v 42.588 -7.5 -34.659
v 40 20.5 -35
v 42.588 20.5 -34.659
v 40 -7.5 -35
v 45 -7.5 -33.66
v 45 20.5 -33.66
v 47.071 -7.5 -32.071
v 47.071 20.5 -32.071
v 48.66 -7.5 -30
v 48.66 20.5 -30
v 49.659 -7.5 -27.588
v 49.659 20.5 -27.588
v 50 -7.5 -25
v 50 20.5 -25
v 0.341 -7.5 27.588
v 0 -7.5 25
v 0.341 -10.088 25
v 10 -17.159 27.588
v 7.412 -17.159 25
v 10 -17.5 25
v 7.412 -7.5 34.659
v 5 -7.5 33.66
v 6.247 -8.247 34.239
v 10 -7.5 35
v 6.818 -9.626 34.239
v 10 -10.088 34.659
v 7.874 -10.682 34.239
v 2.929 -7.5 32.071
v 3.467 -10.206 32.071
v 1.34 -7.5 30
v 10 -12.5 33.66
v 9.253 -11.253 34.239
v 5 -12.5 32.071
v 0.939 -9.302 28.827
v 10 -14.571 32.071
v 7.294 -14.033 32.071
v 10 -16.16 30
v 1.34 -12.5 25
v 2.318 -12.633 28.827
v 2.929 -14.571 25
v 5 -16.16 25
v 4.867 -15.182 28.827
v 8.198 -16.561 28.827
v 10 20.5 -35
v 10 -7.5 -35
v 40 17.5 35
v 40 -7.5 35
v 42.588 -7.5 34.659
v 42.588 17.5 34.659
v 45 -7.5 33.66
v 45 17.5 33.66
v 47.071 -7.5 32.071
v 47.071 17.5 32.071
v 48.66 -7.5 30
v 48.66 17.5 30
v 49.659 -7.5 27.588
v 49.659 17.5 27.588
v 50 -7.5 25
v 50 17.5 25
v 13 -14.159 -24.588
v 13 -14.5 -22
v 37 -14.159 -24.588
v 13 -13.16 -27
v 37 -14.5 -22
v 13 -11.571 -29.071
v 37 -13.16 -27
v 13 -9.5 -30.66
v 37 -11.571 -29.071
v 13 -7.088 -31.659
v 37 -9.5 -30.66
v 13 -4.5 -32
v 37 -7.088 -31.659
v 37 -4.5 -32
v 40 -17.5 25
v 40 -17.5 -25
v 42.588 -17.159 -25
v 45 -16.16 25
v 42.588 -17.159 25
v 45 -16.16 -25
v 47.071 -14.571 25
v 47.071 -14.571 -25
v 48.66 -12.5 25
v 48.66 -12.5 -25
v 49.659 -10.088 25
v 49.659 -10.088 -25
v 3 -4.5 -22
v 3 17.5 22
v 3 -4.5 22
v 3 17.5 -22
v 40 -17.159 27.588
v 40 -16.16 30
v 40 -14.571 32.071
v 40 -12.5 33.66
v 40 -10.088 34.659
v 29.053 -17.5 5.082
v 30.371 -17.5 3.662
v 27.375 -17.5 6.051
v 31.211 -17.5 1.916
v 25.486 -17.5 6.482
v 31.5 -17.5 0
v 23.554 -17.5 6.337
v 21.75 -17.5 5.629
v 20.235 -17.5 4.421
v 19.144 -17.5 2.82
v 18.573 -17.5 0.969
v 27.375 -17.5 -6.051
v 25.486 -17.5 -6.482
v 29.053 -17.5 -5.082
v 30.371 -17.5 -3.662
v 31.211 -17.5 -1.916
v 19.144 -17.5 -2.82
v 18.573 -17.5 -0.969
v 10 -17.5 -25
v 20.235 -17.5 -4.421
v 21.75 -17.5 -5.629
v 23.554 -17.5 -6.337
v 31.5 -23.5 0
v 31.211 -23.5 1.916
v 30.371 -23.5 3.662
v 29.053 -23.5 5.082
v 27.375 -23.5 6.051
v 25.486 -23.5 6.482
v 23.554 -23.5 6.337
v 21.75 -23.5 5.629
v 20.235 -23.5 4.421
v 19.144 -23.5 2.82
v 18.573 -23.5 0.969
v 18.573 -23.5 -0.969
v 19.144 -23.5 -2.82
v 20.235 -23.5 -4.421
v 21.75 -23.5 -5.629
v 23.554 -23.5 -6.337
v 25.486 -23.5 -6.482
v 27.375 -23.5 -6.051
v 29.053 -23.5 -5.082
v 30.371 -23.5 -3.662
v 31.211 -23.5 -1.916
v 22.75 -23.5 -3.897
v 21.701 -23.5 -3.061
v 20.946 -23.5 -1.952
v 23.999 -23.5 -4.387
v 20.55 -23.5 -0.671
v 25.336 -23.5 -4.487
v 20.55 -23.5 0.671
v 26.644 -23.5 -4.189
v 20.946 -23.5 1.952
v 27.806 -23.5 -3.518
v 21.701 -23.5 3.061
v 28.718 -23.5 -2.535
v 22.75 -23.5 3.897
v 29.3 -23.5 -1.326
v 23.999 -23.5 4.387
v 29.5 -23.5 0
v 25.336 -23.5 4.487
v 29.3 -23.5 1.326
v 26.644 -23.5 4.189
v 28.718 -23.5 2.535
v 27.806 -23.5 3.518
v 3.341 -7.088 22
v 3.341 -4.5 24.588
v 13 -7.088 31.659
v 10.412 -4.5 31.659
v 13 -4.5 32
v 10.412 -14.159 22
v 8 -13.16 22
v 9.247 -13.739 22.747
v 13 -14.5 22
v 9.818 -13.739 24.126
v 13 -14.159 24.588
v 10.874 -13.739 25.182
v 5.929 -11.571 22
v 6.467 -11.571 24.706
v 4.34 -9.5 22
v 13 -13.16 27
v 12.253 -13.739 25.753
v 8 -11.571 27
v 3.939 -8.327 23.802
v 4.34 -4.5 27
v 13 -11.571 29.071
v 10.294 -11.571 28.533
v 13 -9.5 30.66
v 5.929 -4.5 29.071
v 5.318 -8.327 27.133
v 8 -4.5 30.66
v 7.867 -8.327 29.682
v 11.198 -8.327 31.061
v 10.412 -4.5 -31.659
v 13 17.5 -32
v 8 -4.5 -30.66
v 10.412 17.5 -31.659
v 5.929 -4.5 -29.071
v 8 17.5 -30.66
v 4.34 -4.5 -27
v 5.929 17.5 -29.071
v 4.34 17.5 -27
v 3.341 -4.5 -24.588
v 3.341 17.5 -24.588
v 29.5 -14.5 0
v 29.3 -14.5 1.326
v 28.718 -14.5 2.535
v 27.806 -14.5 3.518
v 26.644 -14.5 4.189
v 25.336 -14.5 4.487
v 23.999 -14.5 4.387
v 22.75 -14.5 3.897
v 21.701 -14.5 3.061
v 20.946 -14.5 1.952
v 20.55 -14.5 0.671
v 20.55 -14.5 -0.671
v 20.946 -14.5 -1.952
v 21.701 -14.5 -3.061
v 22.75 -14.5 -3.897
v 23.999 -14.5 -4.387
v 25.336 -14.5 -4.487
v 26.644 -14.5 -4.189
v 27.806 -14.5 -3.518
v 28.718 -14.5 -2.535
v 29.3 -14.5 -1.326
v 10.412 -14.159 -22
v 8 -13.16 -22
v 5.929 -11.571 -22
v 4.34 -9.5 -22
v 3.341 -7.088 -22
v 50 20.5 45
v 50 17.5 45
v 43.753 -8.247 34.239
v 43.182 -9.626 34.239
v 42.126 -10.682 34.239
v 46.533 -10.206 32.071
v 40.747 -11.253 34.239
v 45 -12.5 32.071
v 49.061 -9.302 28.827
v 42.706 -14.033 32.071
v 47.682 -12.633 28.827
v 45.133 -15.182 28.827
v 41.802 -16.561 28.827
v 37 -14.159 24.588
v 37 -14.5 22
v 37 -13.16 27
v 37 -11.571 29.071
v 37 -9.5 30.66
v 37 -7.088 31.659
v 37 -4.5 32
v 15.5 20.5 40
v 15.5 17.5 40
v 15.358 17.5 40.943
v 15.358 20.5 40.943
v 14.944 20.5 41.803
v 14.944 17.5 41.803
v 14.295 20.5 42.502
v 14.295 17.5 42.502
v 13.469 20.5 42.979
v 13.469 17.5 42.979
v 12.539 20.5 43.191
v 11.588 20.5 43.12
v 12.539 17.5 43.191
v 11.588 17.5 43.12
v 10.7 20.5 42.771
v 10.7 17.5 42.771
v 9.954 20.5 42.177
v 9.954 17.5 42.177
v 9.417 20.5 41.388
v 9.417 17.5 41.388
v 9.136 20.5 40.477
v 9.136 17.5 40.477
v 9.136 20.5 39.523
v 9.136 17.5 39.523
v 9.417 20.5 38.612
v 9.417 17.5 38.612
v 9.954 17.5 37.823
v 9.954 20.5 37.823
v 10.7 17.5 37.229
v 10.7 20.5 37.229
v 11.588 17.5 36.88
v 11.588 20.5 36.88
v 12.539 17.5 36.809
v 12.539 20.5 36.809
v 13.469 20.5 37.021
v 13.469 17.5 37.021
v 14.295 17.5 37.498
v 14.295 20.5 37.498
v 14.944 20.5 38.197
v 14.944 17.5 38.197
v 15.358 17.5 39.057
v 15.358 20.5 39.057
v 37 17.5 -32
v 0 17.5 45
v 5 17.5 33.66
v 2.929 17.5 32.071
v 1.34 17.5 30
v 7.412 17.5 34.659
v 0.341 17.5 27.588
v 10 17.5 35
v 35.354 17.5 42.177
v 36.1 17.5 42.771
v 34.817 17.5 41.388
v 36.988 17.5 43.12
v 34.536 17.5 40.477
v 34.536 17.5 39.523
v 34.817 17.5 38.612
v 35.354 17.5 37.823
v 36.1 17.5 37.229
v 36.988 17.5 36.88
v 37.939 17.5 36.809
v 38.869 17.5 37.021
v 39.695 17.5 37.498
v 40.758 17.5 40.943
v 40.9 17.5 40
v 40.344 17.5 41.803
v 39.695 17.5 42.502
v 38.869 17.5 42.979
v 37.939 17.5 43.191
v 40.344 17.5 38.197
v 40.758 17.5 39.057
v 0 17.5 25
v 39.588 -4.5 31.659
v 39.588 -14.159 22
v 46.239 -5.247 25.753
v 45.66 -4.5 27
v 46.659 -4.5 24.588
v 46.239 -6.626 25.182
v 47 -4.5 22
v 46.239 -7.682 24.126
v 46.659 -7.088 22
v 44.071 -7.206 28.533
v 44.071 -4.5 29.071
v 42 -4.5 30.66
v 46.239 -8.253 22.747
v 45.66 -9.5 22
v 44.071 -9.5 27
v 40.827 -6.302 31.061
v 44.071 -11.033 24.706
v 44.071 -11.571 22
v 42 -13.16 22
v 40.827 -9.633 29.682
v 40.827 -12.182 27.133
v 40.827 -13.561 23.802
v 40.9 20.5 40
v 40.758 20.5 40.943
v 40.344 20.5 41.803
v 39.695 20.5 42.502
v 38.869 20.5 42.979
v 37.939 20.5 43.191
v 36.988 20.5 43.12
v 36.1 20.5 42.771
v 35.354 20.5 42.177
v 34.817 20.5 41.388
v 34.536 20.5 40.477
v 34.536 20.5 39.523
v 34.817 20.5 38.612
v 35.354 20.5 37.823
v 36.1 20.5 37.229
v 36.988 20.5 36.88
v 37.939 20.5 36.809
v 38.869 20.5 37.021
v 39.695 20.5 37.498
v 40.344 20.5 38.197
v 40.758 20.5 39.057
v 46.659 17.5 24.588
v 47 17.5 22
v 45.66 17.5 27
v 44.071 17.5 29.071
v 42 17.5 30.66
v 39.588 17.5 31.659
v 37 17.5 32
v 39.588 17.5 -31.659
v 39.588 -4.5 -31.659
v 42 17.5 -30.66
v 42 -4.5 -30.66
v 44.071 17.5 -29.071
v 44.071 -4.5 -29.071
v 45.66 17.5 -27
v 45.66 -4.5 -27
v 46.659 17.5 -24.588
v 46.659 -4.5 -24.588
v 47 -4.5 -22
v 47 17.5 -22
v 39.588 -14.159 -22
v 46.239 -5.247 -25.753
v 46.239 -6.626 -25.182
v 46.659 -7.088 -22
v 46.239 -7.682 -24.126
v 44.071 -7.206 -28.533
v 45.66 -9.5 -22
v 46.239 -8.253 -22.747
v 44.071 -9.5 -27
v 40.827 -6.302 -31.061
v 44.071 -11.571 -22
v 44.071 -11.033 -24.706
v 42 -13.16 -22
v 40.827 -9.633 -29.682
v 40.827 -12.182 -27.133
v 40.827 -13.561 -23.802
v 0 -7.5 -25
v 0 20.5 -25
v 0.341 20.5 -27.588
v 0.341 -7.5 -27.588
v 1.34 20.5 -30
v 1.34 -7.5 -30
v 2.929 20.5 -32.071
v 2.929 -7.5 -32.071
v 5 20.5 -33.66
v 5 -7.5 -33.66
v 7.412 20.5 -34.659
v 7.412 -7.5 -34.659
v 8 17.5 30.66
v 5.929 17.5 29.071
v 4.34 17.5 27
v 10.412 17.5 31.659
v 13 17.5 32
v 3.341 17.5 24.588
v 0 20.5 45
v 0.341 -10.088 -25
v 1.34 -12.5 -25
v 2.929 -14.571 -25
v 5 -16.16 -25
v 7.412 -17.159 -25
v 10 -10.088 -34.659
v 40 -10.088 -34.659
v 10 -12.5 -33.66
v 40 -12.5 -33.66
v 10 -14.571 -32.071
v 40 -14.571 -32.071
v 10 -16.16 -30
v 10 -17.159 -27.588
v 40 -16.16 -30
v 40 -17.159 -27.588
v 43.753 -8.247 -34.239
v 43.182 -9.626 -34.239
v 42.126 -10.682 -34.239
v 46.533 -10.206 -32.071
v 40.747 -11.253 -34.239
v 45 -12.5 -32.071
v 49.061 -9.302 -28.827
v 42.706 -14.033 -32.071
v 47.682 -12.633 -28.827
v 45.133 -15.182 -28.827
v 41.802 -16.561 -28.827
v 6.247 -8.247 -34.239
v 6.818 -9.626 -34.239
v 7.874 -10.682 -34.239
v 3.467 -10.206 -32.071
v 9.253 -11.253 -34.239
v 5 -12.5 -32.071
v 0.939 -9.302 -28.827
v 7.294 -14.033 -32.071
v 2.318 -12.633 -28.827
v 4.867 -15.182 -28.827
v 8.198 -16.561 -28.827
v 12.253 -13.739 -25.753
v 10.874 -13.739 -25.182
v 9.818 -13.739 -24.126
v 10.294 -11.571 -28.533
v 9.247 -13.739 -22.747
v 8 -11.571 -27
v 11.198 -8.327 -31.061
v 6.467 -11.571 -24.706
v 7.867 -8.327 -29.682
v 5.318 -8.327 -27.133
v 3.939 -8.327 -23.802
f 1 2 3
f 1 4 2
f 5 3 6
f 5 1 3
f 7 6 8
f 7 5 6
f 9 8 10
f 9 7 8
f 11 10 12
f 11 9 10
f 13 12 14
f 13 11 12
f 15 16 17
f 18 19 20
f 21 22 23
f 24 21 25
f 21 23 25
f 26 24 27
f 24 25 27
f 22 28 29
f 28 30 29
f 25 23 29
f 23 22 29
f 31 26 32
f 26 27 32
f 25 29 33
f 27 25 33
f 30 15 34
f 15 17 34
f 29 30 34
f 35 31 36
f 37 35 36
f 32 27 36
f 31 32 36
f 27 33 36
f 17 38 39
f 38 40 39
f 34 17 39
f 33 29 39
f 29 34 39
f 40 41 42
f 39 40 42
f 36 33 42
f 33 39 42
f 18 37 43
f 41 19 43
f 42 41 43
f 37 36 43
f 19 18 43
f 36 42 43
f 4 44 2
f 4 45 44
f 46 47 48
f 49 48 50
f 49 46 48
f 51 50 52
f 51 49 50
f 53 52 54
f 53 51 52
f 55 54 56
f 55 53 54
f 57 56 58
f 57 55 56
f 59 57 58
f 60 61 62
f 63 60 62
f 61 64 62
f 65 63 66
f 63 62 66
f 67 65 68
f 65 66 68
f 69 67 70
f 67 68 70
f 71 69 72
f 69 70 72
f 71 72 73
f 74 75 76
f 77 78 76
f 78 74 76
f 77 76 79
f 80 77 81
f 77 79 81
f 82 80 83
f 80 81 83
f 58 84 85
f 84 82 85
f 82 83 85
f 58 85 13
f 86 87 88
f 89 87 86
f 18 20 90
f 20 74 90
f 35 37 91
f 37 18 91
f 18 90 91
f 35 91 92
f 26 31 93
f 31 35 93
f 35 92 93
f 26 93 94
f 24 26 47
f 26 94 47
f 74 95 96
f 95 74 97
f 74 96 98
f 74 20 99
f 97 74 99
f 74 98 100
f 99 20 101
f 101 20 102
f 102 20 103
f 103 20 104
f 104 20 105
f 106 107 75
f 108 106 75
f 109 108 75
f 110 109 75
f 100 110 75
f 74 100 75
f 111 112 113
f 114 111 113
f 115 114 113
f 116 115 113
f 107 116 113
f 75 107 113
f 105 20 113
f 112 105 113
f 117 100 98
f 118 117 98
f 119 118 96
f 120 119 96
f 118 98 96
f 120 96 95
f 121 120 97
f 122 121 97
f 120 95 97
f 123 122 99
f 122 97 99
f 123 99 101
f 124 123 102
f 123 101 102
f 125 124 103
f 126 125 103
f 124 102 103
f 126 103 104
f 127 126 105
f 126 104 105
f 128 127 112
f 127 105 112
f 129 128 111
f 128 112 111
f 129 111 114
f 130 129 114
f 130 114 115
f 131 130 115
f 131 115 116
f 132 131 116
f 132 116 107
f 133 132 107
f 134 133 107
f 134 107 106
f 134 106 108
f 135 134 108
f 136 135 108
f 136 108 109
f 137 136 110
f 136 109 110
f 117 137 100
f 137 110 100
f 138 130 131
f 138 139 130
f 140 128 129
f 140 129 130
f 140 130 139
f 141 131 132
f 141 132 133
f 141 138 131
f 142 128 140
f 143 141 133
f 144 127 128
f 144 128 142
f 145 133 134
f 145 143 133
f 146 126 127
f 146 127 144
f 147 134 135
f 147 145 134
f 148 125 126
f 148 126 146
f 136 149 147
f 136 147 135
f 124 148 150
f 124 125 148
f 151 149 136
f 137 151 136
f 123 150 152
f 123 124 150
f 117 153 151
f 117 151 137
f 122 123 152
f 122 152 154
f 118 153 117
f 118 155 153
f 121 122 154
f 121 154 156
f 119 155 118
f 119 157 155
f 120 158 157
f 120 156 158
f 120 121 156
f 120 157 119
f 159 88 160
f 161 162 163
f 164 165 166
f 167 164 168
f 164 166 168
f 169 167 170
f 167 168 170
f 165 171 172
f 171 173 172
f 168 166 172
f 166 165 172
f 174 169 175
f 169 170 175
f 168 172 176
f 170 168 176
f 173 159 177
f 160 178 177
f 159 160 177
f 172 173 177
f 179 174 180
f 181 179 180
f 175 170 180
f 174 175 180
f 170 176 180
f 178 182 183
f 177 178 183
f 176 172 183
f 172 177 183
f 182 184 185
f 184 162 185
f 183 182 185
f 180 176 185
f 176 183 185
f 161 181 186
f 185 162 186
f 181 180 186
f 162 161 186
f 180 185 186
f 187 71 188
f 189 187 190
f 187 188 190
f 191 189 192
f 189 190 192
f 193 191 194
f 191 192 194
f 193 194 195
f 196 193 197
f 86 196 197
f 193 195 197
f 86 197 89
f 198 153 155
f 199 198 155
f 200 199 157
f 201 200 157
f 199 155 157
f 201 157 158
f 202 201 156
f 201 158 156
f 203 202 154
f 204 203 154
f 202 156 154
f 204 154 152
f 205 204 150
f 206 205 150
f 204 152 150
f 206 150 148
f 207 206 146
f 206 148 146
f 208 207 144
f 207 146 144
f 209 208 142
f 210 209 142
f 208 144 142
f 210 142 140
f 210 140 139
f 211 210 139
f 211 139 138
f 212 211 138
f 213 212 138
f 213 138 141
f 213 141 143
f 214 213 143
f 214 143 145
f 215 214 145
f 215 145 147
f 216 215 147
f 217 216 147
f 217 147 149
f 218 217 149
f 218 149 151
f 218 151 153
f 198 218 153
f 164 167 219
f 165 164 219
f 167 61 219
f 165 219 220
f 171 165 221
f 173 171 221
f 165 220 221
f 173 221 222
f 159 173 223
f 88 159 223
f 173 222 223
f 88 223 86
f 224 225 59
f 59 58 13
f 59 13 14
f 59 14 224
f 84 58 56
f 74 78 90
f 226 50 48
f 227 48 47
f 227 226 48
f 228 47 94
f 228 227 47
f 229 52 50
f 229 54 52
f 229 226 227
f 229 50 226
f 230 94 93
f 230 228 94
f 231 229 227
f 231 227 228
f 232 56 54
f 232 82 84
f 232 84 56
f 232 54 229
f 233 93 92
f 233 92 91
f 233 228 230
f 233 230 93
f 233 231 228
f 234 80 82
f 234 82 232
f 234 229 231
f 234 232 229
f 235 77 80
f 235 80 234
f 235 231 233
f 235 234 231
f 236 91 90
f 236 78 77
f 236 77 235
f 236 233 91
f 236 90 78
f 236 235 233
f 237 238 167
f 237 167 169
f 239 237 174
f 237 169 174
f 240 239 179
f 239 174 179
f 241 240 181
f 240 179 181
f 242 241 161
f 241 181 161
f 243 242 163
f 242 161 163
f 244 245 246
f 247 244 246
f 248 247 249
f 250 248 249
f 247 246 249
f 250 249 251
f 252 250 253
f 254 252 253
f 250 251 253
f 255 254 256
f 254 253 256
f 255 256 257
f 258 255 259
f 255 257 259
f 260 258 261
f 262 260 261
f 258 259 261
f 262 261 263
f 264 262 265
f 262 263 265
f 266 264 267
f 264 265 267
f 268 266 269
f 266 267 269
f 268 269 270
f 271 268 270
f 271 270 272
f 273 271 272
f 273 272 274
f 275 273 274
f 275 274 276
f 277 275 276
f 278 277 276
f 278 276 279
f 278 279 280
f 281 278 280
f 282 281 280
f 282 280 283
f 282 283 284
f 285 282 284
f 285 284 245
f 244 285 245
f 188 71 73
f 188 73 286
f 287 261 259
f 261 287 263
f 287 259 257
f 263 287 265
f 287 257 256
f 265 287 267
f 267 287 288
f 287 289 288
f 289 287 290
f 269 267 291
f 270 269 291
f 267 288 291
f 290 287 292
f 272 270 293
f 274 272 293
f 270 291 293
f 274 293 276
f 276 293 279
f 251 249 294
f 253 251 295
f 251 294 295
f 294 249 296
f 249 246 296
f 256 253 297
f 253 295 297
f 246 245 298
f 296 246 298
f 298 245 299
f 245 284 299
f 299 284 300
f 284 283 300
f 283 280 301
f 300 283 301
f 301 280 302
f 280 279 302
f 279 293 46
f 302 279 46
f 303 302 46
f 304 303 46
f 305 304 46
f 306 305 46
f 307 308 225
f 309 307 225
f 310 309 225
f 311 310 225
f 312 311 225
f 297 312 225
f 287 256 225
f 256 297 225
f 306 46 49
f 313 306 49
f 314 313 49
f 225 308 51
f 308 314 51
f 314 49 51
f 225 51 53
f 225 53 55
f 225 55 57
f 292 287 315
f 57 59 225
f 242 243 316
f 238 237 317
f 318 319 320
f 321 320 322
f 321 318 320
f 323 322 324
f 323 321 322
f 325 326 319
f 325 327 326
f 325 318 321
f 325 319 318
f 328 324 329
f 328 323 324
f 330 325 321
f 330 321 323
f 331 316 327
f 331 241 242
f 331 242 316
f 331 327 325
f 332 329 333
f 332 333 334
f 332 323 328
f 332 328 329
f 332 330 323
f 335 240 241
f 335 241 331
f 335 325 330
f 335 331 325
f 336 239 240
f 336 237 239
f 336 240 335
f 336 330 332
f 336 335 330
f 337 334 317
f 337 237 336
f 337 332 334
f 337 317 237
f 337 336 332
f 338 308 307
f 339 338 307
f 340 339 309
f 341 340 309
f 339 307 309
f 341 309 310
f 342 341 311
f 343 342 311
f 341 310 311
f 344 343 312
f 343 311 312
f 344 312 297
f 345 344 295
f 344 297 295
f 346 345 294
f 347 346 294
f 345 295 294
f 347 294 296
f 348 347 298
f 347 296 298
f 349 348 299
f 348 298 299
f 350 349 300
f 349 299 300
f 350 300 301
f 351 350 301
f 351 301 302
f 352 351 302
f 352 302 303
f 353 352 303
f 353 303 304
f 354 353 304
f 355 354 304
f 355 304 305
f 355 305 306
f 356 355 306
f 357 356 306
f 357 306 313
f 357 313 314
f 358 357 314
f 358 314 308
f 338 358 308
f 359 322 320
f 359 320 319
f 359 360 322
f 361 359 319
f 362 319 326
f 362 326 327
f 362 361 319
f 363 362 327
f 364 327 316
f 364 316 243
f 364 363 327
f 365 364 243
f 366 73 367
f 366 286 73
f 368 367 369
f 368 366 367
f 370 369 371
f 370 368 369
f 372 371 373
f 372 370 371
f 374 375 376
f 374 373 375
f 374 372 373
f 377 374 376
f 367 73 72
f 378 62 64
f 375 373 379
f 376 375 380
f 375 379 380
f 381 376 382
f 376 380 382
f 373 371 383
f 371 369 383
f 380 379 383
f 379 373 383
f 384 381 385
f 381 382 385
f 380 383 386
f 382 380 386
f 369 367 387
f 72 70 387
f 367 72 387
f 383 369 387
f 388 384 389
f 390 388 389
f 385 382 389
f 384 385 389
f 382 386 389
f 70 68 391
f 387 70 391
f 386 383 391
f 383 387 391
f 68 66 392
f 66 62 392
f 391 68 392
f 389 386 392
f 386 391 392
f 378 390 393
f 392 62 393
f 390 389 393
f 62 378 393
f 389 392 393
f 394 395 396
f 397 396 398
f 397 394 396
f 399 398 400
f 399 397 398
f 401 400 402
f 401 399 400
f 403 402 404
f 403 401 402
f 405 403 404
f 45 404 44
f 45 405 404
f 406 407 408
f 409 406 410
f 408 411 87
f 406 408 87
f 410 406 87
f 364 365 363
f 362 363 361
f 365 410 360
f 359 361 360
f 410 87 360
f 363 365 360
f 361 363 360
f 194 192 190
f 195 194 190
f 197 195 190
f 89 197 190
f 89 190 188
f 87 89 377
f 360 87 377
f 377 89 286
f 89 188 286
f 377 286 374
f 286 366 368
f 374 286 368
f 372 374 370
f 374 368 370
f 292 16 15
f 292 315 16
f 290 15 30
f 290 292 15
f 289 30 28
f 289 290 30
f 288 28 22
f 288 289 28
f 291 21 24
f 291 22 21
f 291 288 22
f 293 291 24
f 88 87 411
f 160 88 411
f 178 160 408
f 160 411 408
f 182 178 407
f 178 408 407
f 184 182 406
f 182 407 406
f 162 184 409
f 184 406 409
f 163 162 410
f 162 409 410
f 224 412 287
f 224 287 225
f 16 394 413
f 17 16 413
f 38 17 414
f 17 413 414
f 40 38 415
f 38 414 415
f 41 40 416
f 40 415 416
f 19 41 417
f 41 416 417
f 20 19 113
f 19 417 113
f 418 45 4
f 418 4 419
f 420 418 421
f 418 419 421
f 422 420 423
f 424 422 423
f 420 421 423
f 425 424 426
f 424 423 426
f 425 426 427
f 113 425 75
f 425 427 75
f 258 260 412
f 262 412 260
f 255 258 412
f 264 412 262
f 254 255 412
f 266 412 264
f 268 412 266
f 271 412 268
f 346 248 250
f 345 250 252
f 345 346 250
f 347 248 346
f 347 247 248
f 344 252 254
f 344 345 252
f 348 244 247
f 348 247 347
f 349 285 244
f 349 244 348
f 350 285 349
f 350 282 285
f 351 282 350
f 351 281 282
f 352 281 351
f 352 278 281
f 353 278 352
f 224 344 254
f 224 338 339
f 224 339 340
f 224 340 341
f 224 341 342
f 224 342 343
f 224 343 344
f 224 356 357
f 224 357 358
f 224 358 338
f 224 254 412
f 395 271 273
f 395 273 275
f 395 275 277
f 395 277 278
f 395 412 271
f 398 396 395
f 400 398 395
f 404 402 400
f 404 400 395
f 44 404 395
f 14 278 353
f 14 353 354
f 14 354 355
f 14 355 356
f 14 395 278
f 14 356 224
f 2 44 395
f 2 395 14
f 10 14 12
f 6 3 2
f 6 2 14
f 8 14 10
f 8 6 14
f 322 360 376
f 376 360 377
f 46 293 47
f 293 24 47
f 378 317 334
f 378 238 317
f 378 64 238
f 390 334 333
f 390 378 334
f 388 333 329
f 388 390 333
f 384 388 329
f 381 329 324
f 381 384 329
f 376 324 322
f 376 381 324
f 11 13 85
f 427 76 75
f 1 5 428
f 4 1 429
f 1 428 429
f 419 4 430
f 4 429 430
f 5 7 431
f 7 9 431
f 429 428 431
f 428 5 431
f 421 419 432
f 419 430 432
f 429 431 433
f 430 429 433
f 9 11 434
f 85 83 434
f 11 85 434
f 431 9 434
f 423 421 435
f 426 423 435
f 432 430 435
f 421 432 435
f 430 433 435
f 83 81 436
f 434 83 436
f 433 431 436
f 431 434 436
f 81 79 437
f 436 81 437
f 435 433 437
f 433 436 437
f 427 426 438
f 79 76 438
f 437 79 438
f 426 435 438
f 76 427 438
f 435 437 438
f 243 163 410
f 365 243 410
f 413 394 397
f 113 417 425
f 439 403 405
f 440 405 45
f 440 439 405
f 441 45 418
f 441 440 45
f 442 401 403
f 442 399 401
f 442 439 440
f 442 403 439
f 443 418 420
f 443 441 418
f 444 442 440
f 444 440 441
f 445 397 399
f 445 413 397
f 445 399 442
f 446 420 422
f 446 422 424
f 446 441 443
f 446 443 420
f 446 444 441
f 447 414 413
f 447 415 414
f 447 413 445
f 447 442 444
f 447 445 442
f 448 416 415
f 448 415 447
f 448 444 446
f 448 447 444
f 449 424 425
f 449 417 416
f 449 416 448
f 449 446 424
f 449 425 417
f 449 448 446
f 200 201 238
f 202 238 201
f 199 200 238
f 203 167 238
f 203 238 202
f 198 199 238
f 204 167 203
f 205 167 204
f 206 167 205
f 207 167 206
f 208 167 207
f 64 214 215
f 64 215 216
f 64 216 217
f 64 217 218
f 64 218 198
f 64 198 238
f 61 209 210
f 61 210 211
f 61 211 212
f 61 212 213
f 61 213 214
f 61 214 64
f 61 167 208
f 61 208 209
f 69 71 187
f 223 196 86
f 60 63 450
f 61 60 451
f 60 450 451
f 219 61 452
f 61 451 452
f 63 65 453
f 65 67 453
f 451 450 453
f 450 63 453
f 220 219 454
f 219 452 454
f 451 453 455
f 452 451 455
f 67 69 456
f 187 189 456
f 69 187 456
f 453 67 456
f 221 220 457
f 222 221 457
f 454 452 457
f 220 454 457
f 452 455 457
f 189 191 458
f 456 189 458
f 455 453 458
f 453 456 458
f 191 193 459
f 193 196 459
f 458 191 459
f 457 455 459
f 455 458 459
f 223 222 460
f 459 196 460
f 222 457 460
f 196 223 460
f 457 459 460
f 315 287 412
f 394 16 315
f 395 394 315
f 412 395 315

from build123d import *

# Parameters (mm, degrees)
SKETCH1_W           = 70
SKETCH1_H           = 35
BOSS_EXTRUDE1_DEPTH = 50
SHELL1_T            = -3
SKETCH2_W           = 50
SKETCH2_H           = 70
BOSS_EXTRUDE2_DEPTH = 3
SKETCH4_R           = 6.5
BOSS_EXTRUDE3_DEPTH = 6
CUT_EXTRUDE1_REACH  = 46
SKETCH5_R           = 4.5
SKETCH6_W           = 50
SKETCH6_H           = 3
BOSS_EXTRUDE4_DEPTH = 10
SKETCH8_R           = 3.2
CUT_EXTRUDE3_DEPTH  = 4
SKETCH9_R           = 3.2
CUT_EXTRUDE4_DEPTH  = 4
FILLET1_R           = 10
FILLET2_R           = 10


with BuildPart() as part:
    # Sketch1 → Boss-Extrude1 (new body)
    with BuildSketch(Plane(origin=(0, 0, 0), x_dir=(0, 0, -1), z_dir=(1, 0, 0))):
        Rectangle(SKETCH1_W, SKETCH1_H)
    extrude(amount=BOSS_EXTRUDE1_DEPTH)

    # Shell1
    shell1_openings = [part.faces().sort_by_distance(p)[0] for p in [
        (25, 17.5, 0),
    ]]
    offset(amount=SHELL1_T, openings=shell1_openings, kind=Kind.INTERSECTION)

    # Sketch2 → Boss-Extrude2 (add)
    with BuildSketch(Plane(origin=(0, 17.5, 0), x_dir=(1, 0, 0), z_dir=(0, 1, 0))):
        with Locations((25, 0)):
            Rectangle(SKETCH2_W, SKETCH2_H)
    extrude(amount=BOSS_EXTRUDE2_DEPTH)

    # Sketch4 → Boss-Extrude3 (add)
    with BuildSketch(Plane.XZ.offset(17.5)):
        with Locations((25, 0)):
            Circle(SKETCH4_R)
    extrude(amount=BOSS_EXTRUDE3_DEPTH)

    # Sketch5 → Cut-Extrude1 (cut, up to next)
    with BuildSketch(Plane.XZ.offset(23.5), mode=Mode.PRIVATE) as cut_extrude1_sk1:
        with Locations((25, 0)):
            Circle(SKETCH5_R)
    cut_extrude1_tool1 = extrude(cut_extrude1_sk1.sketch, amount=-CUT_EXTRUDE1_REACH, mode=Mode.PRIVATE) & part.part
    add(cut_extrude1_tool1.solids().sort_by_distance((25, -23.5, 0))[0], mode=Mode.SUBTRACT)

    # Sketch6 → Boss-Extrude4 (add)
    with BuildSketch(Plane.XY.offset(35)):
        with Locations((25, 19)):
            Rectangle(SKETCH6_W, SKETCH6_H)
    extrude(amount=BOSS_EXTRUDE4_DEPTH)

    # Sketch8 → Cut-Extrude3 (cut, through all)
    with BuildSketch(Plane.XZ.offset(-17.5)):
        with Locations((12.3, 40)):
            Circle(SKETCH8_R)
    extrude(amount=-CUT_EXTRUDE3_DEPTH, mode=Mode.SUBTRACT)

    # Sketch9 → Cut-Extrude4 (cut, through all)
    with BuildSketch(Plane.XZ.offset(-17.5)):
        with Locations((37.7, 40)):
            Circle(SKETCH9_R)
    extrude(amount=-CUT_EXTRUDE4_DEPTH, mode=Mode.SUBTRACT)

    # Fillet1
    fillet1_edges = [part.edges().sort_by_distance(p)[0] for p in [
        (50, -17.5, 0),
        (50, 1.5, -35),
        (0, -17.5, 0),
        (0, 0, 35),
        (50, 0, 35),
        (0, 1.5, -35),
        (25, -17.5, -35),
        (25, -17.5, 35),
    ]]
    fillet(fillet1_edges, radius=FILLET1_R)

    # Fillet2
    fillet2_edges = [part.edges().sort_by_distance(p)[0] for p in [
        (3, 1.5, -32),
        (25, -14.5, -32),
        (3, 1.5, 32),
        (3, -14.5, 0),
        (25, -14.5, 32),
        (47, 1.5, -32),
        (47, 1.5, 32),
        (47, -14.5, 0),
    ]]
    fillet(fillet2_edges, radius=FILLET2_R)


solid = part.part
